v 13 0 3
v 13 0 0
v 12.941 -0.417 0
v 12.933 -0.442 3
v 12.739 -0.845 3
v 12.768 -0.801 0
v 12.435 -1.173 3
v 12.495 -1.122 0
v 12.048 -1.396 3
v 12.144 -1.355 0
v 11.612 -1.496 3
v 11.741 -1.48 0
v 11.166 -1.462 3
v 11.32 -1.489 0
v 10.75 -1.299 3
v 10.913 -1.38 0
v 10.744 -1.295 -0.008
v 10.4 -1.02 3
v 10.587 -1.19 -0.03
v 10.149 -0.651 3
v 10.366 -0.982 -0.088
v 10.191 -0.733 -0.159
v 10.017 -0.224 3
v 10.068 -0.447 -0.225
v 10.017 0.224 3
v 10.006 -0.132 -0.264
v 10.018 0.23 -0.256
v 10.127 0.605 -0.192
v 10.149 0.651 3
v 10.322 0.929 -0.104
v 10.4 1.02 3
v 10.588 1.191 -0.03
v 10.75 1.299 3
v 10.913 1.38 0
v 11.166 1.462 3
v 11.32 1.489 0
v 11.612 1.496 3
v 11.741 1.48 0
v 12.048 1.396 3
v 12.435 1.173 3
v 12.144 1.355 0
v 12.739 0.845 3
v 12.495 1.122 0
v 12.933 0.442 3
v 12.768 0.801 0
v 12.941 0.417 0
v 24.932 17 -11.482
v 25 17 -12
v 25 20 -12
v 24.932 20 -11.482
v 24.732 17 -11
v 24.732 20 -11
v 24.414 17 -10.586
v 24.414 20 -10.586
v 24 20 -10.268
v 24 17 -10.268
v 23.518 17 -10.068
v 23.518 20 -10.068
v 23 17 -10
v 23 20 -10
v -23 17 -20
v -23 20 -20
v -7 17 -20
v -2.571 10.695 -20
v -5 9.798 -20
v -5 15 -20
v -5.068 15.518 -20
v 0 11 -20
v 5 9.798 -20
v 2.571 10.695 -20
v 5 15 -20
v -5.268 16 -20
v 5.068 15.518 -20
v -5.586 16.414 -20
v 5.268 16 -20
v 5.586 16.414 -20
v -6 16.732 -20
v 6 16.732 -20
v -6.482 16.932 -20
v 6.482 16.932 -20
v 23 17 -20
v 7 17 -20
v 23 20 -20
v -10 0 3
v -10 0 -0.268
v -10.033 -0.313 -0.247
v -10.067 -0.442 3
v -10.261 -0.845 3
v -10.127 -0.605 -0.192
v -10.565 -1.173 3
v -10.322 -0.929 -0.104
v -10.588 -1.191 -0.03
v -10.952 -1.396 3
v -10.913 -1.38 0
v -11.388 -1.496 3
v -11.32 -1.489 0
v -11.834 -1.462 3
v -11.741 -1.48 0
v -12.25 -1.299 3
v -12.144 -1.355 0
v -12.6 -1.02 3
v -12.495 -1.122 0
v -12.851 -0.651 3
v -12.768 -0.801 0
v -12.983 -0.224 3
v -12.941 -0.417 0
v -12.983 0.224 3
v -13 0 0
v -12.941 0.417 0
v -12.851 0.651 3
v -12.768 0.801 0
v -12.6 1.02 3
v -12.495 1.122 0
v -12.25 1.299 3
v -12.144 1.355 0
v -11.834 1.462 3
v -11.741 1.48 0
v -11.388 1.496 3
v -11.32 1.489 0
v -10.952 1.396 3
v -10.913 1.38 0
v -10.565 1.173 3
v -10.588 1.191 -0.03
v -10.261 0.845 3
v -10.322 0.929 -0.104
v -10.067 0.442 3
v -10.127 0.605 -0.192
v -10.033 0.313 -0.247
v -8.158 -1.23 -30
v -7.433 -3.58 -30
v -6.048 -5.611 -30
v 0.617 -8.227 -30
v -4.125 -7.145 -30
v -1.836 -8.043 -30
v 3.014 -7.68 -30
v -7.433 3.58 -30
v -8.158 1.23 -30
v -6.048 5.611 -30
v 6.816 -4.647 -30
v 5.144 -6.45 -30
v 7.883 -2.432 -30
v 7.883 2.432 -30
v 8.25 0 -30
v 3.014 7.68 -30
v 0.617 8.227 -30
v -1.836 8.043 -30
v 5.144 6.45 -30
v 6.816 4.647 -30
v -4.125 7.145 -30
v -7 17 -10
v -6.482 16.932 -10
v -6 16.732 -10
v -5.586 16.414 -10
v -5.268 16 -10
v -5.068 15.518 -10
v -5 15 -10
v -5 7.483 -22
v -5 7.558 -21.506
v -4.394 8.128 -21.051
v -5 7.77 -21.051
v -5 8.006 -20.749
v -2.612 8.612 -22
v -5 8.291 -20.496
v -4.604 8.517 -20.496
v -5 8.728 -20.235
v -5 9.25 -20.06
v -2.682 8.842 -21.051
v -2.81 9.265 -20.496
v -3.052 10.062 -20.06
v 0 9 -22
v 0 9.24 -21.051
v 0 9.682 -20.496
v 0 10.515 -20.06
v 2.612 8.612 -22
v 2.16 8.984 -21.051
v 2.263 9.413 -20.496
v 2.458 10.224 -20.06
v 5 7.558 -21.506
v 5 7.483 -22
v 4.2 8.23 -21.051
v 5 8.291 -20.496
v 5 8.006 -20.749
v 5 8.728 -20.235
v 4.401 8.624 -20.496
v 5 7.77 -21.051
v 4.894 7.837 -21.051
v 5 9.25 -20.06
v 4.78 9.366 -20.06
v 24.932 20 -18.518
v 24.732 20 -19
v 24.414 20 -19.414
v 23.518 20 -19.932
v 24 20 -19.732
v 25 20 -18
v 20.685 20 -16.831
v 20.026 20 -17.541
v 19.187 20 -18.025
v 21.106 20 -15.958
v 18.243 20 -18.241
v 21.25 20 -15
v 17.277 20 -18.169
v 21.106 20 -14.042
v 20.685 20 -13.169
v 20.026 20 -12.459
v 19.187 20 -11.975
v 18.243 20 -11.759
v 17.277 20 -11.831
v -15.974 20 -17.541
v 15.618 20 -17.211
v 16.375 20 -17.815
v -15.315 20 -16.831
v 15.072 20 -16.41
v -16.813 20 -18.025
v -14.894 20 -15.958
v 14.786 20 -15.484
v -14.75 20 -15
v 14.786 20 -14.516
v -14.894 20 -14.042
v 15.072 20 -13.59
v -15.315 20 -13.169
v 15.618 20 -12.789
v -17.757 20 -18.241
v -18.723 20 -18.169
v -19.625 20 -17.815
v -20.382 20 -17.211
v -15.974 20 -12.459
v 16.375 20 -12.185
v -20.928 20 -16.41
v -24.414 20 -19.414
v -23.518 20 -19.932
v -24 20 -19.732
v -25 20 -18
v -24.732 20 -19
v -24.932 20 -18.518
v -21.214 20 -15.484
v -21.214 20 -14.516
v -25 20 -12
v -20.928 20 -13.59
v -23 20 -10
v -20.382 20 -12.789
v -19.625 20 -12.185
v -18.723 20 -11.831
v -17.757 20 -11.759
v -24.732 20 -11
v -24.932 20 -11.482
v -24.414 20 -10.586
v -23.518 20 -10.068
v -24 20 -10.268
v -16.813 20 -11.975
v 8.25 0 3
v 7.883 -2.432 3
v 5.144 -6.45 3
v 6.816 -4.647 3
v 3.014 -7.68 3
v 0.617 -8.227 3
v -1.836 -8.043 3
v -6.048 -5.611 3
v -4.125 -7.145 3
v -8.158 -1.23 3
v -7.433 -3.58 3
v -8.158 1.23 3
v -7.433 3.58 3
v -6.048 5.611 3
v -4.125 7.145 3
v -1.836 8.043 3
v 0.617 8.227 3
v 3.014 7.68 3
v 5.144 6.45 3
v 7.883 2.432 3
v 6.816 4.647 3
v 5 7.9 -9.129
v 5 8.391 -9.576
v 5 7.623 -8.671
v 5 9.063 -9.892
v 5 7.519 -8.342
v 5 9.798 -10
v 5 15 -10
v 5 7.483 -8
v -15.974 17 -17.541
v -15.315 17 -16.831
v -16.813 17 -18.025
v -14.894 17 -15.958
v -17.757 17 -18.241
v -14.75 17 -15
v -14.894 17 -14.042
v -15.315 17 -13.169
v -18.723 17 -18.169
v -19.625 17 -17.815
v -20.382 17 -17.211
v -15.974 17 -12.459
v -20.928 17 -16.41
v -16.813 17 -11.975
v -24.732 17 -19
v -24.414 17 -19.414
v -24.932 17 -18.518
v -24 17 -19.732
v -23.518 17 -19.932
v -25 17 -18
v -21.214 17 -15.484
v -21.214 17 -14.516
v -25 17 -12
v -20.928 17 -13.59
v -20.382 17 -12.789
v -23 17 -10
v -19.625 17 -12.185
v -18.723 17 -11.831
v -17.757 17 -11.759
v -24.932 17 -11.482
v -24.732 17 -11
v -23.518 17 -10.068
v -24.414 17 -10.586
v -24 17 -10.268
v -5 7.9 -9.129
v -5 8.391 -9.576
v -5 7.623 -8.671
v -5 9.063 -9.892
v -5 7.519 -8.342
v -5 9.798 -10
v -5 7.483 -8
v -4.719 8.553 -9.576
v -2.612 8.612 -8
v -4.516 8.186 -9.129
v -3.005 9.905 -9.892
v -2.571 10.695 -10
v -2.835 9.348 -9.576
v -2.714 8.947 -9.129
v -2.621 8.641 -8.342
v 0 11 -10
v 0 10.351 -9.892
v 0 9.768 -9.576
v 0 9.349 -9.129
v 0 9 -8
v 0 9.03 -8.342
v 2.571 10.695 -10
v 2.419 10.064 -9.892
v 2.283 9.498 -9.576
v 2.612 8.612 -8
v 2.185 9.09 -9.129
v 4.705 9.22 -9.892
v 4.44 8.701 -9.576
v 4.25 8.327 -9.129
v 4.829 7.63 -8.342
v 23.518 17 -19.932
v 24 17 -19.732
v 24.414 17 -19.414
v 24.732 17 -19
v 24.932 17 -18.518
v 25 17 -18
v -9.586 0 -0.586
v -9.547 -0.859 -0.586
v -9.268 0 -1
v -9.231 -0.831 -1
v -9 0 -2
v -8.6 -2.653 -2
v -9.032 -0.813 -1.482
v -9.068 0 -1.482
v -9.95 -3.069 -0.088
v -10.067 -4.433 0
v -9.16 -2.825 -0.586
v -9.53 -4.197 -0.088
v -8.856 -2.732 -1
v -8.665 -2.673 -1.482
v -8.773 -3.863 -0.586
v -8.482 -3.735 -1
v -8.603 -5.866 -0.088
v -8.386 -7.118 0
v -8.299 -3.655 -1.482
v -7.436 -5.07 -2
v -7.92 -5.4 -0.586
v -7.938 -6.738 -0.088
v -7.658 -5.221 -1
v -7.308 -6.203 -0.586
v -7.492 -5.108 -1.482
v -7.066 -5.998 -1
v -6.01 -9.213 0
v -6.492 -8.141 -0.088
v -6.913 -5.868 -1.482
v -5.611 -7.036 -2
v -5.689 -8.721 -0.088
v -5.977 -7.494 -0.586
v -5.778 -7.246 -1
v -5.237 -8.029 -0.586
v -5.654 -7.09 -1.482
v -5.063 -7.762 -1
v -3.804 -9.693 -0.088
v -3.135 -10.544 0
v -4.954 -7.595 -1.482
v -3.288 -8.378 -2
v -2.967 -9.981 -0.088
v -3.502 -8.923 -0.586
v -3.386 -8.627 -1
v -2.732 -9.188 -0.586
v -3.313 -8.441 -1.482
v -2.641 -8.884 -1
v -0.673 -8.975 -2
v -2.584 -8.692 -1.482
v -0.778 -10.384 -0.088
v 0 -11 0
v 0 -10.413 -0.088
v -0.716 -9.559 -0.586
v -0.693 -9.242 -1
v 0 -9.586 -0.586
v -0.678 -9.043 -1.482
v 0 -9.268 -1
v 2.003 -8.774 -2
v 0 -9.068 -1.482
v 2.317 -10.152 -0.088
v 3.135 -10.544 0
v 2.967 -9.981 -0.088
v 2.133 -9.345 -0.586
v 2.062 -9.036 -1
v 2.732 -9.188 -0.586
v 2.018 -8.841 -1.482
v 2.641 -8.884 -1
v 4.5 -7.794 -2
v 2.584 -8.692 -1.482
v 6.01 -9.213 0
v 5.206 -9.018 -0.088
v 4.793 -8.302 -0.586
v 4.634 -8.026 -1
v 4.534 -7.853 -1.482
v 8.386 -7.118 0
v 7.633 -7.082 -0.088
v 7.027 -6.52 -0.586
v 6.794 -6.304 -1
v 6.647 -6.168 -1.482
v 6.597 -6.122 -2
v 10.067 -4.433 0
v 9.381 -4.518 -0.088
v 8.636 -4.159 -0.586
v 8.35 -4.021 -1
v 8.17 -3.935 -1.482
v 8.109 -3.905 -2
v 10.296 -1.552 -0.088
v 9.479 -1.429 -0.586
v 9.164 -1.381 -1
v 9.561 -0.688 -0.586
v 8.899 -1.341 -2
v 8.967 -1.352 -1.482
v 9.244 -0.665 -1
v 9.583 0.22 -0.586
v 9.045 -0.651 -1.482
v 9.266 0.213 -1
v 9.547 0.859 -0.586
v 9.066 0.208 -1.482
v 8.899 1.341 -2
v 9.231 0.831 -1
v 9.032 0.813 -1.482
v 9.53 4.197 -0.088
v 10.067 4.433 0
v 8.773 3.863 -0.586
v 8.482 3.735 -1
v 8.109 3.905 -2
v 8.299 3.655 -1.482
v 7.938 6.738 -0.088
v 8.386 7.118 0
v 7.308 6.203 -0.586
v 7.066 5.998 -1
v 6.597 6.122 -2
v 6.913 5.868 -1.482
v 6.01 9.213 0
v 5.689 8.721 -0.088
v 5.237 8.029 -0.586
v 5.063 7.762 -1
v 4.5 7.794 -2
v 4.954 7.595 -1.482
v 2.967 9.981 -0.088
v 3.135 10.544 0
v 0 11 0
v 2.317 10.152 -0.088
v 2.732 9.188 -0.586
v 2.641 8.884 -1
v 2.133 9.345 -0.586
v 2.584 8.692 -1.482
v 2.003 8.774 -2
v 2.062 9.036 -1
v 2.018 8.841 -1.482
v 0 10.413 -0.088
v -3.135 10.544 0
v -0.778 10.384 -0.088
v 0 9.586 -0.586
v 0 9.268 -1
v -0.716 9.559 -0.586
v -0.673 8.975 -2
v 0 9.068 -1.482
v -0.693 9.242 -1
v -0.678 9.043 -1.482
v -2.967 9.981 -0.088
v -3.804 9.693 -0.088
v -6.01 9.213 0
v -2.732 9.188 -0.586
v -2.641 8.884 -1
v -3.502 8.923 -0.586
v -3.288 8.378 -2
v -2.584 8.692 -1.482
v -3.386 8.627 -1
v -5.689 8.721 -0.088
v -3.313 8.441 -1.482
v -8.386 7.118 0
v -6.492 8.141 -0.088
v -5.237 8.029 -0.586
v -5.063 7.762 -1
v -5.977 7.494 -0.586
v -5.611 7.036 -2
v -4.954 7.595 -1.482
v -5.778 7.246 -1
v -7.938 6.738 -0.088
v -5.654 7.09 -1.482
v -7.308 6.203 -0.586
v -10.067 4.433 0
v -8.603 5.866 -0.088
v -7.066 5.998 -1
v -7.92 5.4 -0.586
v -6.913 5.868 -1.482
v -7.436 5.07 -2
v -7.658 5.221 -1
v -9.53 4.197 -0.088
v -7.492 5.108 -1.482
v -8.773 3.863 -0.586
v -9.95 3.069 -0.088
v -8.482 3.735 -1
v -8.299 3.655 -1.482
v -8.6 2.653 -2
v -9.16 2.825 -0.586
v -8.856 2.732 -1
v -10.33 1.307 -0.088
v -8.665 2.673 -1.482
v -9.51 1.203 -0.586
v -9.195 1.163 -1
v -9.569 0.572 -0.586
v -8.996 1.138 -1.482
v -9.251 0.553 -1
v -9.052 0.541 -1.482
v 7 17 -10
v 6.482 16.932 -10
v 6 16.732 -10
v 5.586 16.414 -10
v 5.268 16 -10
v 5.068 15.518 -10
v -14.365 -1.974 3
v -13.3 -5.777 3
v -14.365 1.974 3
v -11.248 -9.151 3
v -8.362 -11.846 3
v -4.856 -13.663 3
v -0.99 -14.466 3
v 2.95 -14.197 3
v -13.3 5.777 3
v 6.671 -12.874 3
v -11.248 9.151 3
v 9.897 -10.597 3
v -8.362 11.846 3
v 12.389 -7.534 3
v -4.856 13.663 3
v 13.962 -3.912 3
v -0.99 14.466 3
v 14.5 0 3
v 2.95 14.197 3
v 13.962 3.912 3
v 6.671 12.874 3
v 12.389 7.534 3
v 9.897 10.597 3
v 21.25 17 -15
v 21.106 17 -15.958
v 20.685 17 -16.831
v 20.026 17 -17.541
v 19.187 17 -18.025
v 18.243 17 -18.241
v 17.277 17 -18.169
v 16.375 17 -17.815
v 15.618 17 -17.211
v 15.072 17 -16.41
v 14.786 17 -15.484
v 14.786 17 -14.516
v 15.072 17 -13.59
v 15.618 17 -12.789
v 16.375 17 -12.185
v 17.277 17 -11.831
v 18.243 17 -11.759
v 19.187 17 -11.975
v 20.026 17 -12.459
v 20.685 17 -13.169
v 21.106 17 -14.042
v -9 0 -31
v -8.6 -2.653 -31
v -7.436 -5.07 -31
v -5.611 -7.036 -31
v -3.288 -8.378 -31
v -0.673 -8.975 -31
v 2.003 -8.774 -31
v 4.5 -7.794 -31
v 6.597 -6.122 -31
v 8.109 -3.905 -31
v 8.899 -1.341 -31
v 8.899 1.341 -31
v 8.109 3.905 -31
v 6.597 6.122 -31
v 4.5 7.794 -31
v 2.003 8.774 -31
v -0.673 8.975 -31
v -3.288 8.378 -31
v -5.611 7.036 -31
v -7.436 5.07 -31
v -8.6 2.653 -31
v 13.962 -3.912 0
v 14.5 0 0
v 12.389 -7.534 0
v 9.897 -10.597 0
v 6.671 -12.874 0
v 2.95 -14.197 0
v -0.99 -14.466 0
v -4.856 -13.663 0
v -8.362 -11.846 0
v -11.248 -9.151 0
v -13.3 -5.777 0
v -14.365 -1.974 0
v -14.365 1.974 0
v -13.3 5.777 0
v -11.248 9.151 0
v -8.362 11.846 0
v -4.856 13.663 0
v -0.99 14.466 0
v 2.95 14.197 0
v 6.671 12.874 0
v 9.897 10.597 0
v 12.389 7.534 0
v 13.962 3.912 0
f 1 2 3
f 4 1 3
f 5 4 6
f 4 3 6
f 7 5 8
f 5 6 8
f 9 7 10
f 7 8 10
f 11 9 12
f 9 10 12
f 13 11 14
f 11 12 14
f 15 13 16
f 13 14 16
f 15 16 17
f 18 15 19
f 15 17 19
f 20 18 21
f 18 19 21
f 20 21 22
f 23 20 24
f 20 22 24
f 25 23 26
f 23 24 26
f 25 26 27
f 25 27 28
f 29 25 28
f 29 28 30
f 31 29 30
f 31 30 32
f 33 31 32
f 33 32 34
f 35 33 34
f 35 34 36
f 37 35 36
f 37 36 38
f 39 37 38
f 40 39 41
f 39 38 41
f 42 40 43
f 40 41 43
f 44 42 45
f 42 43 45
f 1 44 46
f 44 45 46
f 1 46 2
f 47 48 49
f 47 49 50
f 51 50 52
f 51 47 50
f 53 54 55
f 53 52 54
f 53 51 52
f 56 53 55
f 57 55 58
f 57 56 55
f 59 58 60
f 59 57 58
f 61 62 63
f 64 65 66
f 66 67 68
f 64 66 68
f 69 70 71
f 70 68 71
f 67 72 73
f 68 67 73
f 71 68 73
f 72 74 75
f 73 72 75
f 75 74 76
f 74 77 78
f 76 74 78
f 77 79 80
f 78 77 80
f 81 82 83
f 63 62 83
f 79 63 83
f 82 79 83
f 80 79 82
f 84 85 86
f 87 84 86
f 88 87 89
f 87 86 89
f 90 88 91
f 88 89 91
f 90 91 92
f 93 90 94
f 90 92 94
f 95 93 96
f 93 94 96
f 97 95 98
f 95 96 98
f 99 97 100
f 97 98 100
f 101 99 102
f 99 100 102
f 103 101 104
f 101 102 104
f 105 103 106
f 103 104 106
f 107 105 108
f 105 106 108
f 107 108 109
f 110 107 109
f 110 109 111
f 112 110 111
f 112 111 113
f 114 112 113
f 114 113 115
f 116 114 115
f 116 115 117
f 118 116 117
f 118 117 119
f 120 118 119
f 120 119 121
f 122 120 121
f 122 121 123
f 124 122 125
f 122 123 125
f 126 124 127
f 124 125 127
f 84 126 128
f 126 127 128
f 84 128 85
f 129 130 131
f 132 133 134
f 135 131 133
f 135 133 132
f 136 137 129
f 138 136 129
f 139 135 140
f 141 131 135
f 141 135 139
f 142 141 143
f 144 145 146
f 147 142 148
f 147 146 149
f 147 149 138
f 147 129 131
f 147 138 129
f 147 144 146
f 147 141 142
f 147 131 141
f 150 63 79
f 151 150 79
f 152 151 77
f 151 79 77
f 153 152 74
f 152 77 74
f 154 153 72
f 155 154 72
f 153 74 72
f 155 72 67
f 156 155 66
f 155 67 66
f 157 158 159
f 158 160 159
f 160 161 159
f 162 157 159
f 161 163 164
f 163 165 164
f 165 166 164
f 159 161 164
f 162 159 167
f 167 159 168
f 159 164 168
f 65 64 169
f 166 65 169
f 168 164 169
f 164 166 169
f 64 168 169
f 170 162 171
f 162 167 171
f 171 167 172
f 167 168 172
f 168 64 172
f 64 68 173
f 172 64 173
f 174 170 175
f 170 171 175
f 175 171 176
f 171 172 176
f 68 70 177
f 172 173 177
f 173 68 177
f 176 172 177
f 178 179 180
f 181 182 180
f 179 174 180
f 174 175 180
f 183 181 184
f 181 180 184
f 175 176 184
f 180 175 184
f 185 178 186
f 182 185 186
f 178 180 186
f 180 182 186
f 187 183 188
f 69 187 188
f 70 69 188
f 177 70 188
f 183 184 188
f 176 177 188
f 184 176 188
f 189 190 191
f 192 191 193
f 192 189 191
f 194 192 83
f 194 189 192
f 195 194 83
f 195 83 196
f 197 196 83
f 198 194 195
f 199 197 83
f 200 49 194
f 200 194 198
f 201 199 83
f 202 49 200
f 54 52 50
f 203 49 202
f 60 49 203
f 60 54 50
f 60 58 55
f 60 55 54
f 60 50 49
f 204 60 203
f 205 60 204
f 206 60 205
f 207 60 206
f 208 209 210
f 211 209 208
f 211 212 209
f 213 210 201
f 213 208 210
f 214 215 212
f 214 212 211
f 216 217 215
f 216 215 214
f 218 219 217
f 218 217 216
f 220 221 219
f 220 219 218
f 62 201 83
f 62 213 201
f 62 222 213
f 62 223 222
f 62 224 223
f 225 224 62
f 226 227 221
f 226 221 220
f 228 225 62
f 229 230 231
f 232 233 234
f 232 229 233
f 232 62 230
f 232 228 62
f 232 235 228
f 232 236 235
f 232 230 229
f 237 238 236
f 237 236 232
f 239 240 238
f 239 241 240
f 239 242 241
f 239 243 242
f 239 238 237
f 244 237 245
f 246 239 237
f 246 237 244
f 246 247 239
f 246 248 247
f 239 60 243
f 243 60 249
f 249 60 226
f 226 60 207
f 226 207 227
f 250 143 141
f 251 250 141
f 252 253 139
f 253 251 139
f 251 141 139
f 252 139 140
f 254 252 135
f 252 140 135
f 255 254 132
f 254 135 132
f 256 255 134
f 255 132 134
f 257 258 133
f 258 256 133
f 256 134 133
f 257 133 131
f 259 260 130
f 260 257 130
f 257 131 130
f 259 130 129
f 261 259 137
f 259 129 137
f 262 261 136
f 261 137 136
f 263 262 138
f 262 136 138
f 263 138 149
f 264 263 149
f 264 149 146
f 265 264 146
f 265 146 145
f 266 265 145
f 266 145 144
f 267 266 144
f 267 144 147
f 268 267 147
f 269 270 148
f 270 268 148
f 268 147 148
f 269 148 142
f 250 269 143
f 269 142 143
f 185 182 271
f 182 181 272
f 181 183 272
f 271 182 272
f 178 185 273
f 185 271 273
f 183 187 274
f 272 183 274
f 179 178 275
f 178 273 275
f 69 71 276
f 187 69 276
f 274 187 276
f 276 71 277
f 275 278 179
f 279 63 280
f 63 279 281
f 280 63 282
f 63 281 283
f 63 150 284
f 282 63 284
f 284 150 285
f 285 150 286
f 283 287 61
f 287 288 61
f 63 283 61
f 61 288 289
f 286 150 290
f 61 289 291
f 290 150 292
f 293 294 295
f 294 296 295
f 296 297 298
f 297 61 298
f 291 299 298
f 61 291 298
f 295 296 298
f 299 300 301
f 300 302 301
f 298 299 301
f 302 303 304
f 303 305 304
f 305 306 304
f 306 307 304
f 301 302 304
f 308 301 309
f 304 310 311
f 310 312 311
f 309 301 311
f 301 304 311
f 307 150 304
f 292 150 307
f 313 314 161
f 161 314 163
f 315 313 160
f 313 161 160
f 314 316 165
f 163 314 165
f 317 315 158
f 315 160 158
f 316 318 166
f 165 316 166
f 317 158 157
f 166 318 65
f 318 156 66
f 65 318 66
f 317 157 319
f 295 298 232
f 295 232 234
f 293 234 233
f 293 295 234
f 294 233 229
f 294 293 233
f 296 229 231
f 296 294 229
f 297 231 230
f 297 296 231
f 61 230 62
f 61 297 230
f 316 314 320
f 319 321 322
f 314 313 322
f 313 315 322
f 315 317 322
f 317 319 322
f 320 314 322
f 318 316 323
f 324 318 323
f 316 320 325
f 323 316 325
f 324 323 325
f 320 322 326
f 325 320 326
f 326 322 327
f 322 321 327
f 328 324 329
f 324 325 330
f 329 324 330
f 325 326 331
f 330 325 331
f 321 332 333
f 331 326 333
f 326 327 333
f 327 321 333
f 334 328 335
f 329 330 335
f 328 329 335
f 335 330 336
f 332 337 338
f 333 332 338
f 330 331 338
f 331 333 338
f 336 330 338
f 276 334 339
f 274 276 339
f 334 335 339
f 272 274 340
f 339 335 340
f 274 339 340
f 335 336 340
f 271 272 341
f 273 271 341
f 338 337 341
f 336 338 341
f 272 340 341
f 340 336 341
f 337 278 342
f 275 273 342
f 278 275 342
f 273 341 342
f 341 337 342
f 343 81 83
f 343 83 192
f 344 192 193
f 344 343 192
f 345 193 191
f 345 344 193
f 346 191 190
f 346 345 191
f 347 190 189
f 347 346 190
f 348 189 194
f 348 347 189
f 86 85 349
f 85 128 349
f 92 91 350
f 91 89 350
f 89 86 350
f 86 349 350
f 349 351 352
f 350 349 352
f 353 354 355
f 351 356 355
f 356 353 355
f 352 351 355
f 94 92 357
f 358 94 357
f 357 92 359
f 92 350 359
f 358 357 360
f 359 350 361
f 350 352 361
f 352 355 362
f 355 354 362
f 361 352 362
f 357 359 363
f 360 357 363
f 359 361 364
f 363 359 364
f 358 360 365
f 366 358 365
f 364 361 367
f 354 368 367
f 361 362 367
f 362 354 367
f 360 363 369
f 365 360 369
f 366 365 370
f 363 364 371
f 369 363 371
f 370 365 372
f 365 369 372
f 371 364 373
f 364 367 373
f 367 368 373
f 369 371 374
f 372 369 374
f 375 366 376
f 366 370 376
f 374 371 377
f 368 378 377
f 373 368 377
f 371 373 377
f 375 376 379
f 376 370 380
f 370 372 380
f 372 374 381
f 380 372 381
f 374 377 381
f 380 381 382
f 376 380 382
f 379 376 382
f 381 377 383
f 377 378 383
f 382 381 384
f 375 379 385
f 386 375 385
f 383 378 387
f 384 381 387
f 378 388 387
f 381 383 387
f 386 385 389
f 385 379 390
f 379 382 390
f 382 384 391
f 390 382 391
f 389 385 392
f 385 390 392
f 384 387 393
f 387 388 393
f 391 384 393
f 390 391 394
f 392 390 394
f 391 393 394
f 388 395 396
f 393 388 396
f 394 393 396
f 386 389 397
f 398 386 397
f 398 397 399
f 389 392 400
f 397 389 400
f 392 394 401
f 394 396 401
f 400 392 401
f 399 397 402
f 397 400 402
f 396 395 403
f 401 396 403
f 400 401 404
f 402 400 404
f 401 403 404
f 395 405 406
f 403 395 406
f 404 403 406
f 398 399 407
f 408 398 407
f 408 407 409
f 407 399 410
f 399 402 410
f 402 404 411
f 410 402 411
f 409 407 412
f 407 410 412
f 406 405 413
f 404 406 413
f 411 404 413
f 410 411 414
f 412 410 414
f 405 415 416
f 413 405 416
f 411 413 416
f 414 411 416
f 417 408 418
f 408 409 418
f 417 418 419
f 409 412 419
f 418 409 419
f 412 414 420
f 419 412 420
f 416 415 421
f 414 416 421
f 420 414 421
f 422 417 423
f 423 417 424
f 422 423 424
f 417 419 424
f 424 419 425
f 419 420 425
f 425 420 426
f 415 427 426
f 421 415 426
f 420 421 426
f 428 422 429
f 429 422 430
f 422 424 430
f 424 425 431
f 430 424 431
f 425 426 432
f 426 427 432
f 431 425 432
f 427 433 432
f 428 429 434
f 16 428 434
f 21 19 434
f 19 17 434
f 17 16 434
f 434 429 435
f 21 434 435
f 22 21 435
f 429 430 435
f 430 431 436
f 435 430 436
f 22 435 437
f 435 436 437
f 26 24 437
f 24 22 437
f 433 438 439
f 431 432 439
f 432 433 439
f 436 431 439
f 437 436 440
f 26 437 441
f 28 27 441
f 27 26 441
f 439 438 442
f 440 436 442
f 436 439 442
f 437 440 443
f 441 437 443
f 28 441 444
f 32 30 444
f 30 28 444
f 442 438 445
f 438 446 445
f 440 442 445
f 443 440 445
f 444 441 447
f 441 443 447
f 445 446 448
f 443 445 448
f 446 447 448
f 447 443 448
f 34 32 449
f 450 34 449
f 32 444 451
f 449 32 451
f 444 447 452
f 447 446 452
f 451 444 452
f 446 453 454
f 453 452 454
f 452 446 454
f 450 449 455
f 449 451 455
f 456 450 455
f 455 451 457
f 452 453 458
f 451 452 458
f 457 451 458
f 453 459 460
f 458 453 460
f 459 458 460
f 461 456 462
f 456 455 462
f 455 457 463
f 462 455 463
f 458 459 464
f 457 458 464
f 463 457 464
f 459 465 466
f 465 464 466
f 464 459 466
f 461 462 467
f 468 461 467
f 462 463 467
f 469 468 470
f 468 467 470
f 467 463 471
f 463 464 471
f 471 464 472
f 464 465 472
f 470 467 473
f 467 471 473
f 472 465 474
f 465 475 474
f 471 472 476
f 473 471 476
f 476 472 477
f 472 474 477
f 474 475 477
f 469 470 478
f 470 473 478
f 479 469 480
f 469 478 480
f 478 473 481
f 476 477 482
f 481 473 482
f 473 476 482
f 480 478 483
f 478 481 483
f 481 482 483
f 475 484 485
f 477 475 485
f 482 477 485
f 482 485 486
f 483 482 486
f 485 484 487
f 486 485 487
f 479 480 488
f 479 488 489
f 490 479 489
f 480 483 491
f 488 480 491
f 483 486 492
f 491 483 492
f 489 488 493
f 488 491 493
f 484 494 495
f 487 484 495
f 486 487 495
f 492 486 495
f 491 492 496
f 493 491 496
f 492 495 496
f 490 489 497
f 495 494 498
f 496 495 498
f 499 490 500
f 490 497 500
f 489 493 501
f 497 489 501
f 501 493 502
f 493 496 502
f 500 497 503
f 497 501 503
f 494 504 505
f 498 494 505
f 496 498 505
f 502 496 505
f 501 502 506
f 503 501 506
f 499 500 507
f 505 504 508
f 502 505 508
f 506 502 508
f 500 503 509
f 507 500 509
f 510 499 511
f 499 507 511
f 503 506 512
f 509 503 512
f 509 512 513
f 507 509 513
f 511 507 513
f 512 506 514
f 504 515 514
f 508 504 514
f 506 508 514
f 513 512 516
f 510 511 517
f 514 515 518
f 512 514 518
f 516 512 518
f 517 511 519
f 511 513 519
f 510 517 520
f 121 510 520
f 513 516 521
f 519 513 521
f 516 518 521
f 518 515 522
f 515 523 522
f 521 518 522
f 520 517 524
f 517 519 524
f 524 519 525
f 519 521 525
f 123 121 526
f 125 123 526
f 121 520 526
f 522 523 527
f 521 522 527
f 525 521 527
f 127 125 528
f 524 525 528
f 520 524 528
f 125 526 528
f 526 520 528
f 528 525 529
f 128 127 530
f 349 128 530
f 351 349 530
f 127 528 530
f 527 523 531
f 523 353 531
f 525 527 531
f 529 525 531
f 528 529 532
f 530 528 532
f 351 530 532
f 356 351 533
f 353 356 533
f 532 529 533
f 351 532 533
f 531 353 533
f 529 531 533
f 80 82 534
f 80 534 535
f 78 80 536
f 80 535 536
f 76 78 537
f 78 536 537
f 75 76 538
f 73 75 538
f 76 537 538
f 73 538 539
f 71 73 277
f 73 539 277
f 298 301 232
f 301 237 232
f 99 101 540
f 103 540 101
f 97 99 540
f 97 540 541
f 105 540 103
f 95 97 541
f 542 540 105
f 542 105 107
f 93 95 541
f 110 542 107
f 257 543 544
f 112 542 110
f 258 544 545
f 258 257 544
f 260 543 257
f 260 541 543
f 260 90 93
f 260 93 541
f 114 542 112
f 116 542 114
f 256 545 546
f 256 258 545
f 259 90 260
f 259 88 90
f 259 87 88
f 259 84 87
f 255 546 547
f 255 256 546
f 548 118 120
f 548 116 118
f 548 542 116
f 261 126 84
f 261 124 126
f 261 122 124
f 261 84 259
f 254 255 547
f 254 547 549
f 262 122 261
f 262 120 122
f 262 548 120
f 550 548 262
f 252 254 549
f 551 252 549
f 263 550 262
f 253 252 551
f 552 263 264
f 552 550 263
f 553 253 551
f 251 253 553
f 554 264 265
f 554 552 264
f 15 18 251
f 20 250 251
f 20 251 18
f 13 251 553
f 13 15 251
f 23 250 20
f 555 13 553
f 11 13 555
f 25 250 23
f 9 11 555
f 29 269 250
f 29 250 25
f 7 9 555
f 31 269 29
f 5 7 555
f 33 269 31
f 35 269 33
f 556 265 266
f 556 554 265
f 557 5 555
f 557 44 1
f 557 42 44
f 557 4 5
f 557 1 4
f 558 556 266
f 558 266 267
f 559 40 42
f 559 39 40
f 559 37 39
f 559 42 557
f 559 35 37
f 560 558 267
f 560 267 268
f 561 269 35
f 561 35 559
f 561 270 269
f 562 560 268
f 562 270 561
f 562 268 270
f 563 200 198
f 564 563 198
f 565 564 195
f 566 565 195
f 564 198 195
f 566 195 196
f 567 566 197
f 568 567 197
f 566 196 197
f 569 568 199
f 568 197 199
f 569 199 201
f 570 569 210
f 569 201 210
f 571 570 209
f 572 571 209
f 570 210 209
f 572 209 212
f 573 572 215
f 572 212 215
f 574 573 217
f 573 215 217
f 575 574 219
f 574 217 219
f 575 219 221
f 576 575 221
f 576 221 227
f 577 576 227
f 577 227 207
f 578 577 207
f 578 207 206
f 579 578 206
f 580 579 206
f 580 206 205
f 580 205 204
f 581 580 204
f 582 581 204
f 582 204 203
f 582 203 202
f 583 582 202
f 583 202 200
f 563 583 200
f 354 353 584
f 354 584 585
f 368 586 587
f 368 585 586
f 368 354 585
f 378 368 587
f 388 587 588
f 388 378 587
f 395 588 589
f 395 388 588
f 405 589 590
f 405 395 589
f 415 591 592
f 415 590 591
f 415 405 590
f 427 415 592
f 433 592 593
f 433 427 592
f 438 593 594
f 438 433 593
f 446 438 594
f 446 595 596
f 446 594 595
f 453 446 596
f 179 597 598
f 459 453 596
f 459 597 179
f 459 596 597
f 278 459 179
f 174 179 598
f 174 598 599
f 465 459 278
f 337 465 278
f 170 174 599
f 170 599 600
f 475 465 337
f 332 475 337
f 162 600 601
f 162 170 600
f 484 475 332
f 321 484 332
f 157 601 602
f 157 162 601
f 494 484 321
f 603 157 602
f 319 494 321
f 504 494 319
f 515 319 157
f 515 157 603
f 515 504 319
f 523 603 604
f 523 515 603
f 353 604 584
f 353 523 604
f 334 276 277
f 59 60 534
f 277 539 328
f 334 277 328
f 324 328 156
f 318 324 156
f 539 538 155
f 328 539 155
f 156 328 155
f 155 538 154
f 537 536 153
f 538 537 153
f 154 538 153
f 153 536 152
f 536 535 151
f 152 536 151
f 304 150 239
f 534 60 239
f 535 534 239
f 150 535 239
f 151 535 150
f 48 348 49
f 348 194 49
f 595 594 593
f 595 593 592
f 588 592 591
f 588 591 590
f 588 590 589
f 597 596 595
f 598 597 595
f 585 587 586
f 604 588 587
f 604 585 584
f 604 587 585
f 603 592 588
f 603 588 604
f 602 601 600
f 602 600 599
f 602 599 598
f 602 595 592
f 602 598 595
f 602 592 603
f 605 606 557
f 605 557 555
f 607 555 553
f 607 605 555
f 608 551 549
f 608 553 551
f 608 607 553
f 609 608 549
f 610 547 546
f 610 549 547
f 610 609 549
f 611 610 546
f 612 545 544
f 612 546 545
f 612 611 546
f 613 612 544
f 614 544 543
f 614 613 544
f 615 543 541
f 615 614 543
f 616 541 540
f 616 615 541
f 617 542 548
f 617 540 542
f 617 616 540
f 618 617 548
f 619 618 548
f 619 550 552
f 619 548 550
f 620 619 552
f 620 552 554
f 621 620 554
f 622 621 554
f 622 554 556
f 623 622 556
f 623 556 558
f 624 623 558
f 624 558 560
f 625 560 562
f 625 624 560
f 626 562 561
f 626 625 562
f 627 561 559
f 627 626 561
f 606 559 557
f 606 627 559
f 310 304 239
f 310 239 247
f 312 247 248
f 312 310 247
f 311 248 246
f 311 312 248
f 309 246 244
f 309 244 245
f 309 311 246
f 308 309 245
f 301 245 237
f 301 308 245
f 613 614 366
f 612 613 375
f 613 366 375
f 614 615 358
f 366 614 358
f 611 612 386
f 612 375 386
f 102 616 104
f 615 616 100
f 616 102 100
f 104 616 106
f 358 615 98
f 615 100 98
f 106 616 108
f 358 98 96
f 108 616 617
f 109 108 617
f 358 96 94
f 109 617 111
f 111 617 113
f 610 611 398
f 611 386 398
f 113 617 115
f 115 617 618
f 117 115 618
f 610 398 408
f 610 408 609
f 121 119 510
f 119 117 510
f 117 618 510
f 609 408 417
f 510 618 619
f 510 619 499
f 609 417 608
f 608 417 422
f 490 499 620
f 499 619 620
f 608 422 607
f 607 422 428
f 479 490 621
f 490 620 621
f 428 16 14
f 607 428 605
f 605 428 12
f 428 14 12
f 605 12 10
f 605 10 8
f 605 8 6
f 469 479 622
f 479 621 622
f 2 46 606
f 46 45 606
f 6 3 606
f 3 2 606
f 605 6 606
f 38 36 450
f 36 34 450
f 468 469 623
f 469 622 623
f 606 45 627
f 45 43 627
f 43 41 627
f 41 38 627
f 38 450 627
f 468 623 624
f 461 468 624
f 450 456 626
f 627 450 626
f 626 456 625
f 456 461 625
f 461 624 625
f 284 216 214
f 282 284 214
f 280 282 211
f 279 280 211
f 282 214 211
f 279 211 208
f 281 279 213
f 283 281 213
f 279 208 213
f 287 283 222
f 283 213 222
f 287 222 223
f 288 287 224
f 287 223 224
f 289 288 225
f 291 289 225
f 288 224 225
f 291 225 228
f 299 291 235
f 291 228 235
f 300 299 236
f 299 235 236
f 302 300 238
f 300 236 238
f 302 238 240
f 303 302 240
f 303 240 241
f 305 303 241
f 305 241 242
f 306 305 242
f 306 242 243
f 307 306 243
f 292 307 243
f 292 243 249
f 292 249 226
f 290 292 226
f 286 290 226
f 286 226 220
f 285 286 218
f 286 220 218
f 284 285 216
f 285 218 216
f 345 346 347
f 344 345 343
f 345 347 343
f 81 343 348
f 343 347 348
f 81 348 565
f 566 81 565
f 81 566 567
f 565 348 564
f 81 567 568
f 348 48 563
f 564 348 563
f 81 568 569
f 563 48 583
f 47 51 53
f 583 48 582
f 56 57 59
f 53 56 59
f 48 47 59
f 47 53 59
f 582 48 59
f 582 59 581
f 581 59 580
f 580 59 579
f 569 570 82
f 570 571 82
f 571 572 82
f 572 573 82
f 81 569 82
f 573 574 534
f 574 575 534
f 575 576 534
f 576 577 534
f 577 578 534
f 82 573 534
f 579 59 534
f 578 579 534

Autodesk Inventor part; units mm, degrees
ref_plane "YZ Plane" through (0, 0, 0) normal (1, 0, 0) x (0, 1, 0)
ref_plane "XY Plane" through (0, 0, 0) normal (0, 0, 1) x (1, 0, 0)
sketch "Sketch1" plane through (0, 0, 0) normal (0, 0, 1) x (1, 0, 0)
  circle A0 centre (0, 0) radius 14.5
  circle A1 centre (11.5, 0) radius 1.5
  line L0 (0, 16.0858) -> (0, -16.9174) construction
  line L1 (-27.4443, 0) -> (33.7473, 0) construction
  circle A2 centre (-11.5, 0) radius 1.5
  circle A3 centre (0, 0) radius 8.25
  dimension "d0" = 29
  dimension "d1" = 3
  dimension "d2" = 11.5
  dimension "d3" = 16.5
extrude "Extrusion1" add sketch "Sketch1" along normal blind 3
sketch "Sketch2" plane through (0, 0, 0) normal (0, 0, -1) x (-1, 0, 0)
  circle A0 centre (0, 0) radius 9
  dimension "d6" = 18
extrude "Extrusion2" add sketch "Sketch2" along normal blind 31
fillet "Fillet1" radius 2 1 edges at (9, 0, 0)
sketch "Sketch3" plane through (0, 0, 0) normal (0, 0, 1) x (1, 0, 0)
  circle A0 centre (0, 0) radius 8.25 projected
extrude "Extrusion3" cut sketch "Sketch3" against normal blind 30
ref_plane "Work Plane1" through (0, 20, 0) normal (0, 1, 0) x (-1, 0, 0)
sketch "Sketch5" plane through (0, 20, 0) normal (0, 1, 0) x (-1, 0, 0)
  line L0 (-25, -10) -> (25, -10)
  line L1 (25, -10) -> (25, -20)
  line L2 (25, -20) -> (-25, -20)
  line L3 (-25, -20) -> (-25, -10)
  line L4 (-25, -10) -> (25, -20) construction
  line L5 (25, -10) -> (-25, -20) construction
  point P0 (0, 0)
  point P1 (0, -15)
  dimension "d19" = 50
  dimension "d20" = 10
  dimension "d27" = 15
extrude "Extrusion5" add sketch "Sketch5" against normal blind 3
fillet "Fillet3" radius 2 4 edges at (-25, 18.5, -10) (-25, 18.5, -20) (25, 18.5, -10) (25, 18.5, -20)
sketch "Sketch6" plane through (0, 17, 0) normal (0, -1, 0) x (1, 0, 0)
  line L0 (-5, -20) -> (5, -20)
  line L1 (5, -20) -> (5, -10)
  line L2 (5, -10) -> (-5, -10)
  line L3 (-5, -10) -> (-5, -20)
  line L4 (-5, -20) -> (5, -10) construction
  line L5 (5, -20) -> (-5, -10) construction
  point P0 (0, 0)
  point P1 (0, -15)
  dimension "d24" = 10
  dimension "d25" = 10
  dimension "d26" = 15
extrude "Extrusion6" add sketch "Sketch6" along normal up to next
fillet "Fillet4" radius 2 2 edges at (5, 17, -15) (-5, 17, -15)
fillet "Fillet5" radius 2 2 edges at (0, 9, -10) (0, 9, -20)
sketch "Sketch7" plane through (0, 20, 0) normal (0, 1, 0) x (1, 0, 0)
  circle A0 centre (18, 15) radius 3.25
  circle A1 centre (-18, 15) radius 3.25
  line L0 (0, -10.182) -> (0, 25.8871) construction
  line L1 (-23, 10) -> (23, 10) projected
  point P0 (0, 0)
  dimension "d32" = 6.5
  dimension "d33" = 6.5
  dimension "d34" = 36
  dimension "d35" = 5
extrude "Extrusion7" cut sketch "Sketch7" against normal blind 10
properties part number "AcopleTC"
